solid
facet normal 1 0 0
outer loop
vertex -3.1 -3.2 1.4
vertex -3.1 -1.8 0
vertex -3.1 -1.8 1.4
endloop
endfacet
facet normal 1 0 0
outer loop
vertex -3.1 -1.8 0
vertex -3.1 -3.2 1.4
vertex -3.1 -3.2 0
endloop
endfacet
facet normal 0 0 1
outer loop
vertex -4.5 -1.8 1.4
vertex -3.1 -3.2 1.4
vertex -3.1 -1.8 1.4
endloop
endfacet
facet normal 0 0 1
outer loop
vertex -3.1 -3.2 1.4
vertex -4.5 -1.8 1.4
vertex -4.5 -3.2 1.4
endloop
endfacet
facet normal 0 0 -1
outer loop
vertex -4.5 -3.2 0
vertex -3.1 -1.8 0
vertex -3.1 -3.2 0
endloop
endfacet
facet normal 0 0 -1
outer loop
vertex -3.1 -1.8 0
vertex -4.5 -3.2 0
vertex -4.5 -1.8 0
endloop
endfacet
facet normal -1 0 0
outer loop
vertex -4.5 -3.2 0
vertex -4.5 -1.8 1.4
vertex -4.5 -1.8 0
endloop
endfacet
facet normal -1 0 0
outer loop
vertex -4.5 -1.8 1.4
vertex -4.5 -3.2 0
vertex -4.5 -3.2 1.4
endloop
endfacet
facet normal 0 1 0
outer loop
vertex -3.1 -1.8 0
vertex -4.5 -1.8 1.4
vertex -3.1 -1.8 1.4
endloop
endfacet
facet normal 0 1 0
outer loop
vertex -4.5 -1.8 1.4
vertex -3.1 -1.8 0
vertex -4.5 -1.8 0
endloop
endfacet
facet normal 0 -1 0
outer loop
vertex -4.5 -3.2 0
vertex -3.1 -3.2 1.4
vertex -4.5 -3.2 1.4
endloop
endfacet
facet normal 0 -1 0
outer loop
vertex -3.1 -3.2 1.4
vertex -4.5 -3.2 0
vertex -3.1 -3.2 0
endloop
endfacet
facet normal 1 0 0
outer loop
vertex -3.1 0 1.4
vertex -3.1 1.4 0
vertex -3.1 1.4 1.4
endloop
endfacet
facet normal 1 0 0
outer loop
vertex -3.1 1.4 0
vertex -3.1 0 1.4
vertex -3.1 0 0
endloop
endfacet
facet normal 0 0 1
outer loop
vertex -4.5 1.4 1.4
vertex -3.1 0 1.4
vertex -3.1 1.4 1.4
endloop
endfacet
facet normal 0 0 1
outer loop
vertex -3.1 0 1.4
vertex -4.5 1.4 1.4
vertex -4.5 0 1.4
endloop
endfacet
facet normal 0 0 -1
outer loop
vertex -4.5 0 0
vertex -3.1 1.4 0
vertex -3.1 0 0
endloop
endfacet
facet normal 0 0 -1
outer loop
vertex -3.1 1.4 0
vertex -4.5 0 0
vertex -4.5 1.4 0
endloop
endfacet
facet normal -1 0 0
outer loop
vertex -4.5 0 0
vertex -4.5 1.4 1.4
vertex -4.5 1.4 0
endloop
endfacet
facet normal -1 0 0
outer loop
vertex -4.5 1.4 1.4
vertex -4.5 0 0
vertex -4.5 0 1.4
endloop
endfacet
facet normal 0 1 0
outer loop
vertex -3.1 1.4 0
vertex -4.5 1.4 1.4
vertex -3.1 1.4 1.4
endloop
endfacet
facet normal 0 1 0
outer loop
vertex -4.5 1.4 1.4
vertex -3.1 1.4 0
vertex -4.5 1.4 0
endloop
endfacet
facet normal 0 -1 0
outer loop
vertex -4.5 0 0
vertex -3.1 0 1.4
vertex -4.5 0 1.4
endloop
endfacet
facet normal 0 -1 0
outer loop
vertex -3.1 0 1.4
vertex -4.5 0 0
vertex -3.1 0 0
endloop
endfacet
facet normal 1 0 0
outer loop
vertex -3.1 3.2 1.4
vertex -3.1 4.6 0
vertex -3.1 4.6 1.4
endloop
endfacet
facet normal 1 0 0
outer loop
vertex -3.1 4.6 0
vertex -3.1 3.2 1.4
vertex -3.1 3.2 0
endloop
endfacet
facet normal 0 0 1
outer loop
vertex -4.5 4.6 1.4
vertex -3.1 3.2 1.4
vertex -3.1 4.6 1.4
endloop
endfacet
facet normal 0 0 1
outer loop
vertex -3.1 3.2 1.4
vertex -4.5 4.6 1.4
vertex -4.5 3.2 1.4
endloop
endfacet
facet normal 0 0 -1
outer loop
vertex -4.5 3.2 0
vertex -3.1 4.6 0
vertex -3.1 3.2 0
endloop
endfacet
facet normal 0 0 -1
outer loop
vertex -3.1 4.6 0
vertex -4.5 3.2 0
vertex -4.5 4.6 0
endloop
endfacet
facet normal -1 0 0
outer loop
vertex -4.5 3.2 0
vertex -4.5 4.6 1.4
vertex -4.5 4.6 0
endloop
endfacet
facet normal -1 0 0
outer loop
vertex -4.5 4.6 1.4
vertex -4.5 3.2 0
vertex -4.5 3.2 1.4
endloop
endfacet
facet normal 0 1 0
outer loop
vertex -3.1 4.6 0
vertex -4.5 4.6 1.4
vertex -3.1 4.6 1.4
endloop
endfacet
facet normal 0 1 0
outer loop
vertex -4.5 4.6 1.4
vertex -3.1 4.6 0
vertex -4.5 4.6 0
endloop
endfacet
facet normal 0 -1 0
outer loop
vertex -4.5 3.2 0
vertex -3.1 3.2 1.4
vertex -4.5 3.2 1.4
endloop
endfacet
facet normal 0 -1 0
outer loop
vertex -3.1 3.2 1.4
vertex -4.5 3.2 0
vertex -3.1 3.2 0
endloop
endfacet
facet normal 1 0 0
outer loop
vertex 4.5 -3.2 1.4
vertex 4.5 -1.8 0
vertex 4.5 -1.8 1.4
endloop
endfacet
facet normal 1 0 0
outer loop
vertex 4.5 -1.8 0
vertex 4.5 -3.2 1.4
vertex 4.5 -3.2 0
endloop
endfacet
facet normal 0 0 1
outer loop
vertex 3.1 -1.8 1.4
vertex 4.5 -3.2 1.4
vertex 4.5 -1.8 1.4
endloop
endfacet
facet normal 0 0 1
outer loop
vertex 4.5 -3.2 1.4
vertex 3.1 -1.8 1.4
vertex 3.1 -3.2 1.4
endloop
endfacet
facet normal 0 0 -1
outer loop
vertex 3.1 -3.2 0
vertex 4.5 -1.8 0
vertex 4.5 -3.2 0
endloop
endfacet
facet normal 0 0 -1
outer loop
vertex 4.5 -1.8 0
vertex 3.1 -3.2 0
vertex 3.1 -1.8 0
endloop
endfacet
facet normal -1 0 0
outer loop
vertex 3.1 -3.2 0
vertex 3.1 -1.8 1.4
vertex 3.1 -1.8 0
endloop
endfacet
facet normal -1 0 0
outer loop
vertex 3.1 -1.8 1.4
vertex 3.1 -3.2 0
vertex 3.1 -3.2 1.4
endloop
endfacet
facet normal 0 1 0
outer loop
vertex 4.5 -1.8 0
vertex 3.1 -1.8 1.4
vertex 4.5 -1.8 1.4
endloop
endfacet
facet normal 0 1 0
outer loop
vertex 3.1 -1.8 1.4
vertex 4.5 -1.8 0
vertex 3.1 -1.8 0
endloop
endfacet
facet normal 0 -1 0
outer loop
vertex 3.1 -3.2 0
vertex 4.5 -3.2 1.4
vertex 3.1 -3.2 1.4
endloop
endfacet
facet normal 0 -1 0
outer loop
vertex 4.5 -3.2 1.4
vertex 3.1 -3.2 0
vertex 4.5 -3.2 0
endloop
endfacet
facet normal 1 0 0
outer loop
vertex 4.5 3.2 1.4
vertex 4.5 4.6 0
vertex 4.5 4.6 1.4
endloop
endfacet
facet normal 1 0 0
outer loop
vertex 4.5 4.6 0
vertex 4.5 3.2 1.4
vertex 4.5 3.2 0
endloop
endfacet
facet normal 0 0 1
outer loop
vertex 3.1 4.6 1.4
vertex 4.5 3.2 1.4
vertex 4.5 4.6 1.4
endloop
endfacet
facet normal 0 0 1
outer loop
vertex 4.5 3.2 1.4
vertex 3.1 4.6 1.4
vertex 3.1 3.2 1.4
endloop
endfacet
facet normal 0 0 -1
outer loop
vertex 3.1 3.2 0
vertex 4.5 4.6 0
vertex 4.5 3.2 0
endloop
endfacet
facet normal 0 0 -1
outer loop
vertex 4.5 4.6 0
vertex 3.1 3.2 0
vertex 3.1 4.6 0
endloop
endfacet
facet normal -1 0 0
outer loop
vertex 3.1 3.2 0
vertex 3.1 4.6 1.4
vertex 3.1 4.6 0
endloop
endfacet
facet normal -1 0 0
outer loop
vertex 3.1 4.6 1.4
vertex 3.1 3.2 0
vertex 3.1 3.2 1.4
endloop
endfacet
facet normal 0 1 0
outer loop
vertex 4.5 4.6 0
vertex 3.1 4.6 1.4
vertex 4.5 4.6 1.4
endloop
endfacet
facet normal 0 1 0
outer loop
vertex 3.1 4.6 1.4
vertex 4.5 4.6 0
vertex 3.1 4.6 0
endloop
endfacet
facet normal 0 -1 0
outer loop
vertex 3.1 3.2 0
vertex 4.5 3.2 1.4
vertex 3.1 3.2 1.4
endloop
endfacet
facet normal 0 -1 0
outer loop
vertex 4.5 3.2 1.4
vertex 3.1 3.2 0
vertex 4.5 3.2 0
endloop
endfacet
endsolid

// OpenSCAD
union() {
  translate([-4.5, -3.2, 0.0]) cube(size=[1.4,1.4,1.4], center=false);
  translate([-4.5, 0.0, 0.0]) cube(size=[1.4,1.4,1.4], center=false);
  translate([-4.5, 3.2, 0.0]) cube(size=[1.4,1.4,1.4], center=false);
  translate([3.1, -3.2, 0.0]) cube(size=[1.4,1.4,1.4], center=false);
  translate([3.1, 3.2, 0.0]) cube(size=[1.4,1.4,1.4], center=false);
}
